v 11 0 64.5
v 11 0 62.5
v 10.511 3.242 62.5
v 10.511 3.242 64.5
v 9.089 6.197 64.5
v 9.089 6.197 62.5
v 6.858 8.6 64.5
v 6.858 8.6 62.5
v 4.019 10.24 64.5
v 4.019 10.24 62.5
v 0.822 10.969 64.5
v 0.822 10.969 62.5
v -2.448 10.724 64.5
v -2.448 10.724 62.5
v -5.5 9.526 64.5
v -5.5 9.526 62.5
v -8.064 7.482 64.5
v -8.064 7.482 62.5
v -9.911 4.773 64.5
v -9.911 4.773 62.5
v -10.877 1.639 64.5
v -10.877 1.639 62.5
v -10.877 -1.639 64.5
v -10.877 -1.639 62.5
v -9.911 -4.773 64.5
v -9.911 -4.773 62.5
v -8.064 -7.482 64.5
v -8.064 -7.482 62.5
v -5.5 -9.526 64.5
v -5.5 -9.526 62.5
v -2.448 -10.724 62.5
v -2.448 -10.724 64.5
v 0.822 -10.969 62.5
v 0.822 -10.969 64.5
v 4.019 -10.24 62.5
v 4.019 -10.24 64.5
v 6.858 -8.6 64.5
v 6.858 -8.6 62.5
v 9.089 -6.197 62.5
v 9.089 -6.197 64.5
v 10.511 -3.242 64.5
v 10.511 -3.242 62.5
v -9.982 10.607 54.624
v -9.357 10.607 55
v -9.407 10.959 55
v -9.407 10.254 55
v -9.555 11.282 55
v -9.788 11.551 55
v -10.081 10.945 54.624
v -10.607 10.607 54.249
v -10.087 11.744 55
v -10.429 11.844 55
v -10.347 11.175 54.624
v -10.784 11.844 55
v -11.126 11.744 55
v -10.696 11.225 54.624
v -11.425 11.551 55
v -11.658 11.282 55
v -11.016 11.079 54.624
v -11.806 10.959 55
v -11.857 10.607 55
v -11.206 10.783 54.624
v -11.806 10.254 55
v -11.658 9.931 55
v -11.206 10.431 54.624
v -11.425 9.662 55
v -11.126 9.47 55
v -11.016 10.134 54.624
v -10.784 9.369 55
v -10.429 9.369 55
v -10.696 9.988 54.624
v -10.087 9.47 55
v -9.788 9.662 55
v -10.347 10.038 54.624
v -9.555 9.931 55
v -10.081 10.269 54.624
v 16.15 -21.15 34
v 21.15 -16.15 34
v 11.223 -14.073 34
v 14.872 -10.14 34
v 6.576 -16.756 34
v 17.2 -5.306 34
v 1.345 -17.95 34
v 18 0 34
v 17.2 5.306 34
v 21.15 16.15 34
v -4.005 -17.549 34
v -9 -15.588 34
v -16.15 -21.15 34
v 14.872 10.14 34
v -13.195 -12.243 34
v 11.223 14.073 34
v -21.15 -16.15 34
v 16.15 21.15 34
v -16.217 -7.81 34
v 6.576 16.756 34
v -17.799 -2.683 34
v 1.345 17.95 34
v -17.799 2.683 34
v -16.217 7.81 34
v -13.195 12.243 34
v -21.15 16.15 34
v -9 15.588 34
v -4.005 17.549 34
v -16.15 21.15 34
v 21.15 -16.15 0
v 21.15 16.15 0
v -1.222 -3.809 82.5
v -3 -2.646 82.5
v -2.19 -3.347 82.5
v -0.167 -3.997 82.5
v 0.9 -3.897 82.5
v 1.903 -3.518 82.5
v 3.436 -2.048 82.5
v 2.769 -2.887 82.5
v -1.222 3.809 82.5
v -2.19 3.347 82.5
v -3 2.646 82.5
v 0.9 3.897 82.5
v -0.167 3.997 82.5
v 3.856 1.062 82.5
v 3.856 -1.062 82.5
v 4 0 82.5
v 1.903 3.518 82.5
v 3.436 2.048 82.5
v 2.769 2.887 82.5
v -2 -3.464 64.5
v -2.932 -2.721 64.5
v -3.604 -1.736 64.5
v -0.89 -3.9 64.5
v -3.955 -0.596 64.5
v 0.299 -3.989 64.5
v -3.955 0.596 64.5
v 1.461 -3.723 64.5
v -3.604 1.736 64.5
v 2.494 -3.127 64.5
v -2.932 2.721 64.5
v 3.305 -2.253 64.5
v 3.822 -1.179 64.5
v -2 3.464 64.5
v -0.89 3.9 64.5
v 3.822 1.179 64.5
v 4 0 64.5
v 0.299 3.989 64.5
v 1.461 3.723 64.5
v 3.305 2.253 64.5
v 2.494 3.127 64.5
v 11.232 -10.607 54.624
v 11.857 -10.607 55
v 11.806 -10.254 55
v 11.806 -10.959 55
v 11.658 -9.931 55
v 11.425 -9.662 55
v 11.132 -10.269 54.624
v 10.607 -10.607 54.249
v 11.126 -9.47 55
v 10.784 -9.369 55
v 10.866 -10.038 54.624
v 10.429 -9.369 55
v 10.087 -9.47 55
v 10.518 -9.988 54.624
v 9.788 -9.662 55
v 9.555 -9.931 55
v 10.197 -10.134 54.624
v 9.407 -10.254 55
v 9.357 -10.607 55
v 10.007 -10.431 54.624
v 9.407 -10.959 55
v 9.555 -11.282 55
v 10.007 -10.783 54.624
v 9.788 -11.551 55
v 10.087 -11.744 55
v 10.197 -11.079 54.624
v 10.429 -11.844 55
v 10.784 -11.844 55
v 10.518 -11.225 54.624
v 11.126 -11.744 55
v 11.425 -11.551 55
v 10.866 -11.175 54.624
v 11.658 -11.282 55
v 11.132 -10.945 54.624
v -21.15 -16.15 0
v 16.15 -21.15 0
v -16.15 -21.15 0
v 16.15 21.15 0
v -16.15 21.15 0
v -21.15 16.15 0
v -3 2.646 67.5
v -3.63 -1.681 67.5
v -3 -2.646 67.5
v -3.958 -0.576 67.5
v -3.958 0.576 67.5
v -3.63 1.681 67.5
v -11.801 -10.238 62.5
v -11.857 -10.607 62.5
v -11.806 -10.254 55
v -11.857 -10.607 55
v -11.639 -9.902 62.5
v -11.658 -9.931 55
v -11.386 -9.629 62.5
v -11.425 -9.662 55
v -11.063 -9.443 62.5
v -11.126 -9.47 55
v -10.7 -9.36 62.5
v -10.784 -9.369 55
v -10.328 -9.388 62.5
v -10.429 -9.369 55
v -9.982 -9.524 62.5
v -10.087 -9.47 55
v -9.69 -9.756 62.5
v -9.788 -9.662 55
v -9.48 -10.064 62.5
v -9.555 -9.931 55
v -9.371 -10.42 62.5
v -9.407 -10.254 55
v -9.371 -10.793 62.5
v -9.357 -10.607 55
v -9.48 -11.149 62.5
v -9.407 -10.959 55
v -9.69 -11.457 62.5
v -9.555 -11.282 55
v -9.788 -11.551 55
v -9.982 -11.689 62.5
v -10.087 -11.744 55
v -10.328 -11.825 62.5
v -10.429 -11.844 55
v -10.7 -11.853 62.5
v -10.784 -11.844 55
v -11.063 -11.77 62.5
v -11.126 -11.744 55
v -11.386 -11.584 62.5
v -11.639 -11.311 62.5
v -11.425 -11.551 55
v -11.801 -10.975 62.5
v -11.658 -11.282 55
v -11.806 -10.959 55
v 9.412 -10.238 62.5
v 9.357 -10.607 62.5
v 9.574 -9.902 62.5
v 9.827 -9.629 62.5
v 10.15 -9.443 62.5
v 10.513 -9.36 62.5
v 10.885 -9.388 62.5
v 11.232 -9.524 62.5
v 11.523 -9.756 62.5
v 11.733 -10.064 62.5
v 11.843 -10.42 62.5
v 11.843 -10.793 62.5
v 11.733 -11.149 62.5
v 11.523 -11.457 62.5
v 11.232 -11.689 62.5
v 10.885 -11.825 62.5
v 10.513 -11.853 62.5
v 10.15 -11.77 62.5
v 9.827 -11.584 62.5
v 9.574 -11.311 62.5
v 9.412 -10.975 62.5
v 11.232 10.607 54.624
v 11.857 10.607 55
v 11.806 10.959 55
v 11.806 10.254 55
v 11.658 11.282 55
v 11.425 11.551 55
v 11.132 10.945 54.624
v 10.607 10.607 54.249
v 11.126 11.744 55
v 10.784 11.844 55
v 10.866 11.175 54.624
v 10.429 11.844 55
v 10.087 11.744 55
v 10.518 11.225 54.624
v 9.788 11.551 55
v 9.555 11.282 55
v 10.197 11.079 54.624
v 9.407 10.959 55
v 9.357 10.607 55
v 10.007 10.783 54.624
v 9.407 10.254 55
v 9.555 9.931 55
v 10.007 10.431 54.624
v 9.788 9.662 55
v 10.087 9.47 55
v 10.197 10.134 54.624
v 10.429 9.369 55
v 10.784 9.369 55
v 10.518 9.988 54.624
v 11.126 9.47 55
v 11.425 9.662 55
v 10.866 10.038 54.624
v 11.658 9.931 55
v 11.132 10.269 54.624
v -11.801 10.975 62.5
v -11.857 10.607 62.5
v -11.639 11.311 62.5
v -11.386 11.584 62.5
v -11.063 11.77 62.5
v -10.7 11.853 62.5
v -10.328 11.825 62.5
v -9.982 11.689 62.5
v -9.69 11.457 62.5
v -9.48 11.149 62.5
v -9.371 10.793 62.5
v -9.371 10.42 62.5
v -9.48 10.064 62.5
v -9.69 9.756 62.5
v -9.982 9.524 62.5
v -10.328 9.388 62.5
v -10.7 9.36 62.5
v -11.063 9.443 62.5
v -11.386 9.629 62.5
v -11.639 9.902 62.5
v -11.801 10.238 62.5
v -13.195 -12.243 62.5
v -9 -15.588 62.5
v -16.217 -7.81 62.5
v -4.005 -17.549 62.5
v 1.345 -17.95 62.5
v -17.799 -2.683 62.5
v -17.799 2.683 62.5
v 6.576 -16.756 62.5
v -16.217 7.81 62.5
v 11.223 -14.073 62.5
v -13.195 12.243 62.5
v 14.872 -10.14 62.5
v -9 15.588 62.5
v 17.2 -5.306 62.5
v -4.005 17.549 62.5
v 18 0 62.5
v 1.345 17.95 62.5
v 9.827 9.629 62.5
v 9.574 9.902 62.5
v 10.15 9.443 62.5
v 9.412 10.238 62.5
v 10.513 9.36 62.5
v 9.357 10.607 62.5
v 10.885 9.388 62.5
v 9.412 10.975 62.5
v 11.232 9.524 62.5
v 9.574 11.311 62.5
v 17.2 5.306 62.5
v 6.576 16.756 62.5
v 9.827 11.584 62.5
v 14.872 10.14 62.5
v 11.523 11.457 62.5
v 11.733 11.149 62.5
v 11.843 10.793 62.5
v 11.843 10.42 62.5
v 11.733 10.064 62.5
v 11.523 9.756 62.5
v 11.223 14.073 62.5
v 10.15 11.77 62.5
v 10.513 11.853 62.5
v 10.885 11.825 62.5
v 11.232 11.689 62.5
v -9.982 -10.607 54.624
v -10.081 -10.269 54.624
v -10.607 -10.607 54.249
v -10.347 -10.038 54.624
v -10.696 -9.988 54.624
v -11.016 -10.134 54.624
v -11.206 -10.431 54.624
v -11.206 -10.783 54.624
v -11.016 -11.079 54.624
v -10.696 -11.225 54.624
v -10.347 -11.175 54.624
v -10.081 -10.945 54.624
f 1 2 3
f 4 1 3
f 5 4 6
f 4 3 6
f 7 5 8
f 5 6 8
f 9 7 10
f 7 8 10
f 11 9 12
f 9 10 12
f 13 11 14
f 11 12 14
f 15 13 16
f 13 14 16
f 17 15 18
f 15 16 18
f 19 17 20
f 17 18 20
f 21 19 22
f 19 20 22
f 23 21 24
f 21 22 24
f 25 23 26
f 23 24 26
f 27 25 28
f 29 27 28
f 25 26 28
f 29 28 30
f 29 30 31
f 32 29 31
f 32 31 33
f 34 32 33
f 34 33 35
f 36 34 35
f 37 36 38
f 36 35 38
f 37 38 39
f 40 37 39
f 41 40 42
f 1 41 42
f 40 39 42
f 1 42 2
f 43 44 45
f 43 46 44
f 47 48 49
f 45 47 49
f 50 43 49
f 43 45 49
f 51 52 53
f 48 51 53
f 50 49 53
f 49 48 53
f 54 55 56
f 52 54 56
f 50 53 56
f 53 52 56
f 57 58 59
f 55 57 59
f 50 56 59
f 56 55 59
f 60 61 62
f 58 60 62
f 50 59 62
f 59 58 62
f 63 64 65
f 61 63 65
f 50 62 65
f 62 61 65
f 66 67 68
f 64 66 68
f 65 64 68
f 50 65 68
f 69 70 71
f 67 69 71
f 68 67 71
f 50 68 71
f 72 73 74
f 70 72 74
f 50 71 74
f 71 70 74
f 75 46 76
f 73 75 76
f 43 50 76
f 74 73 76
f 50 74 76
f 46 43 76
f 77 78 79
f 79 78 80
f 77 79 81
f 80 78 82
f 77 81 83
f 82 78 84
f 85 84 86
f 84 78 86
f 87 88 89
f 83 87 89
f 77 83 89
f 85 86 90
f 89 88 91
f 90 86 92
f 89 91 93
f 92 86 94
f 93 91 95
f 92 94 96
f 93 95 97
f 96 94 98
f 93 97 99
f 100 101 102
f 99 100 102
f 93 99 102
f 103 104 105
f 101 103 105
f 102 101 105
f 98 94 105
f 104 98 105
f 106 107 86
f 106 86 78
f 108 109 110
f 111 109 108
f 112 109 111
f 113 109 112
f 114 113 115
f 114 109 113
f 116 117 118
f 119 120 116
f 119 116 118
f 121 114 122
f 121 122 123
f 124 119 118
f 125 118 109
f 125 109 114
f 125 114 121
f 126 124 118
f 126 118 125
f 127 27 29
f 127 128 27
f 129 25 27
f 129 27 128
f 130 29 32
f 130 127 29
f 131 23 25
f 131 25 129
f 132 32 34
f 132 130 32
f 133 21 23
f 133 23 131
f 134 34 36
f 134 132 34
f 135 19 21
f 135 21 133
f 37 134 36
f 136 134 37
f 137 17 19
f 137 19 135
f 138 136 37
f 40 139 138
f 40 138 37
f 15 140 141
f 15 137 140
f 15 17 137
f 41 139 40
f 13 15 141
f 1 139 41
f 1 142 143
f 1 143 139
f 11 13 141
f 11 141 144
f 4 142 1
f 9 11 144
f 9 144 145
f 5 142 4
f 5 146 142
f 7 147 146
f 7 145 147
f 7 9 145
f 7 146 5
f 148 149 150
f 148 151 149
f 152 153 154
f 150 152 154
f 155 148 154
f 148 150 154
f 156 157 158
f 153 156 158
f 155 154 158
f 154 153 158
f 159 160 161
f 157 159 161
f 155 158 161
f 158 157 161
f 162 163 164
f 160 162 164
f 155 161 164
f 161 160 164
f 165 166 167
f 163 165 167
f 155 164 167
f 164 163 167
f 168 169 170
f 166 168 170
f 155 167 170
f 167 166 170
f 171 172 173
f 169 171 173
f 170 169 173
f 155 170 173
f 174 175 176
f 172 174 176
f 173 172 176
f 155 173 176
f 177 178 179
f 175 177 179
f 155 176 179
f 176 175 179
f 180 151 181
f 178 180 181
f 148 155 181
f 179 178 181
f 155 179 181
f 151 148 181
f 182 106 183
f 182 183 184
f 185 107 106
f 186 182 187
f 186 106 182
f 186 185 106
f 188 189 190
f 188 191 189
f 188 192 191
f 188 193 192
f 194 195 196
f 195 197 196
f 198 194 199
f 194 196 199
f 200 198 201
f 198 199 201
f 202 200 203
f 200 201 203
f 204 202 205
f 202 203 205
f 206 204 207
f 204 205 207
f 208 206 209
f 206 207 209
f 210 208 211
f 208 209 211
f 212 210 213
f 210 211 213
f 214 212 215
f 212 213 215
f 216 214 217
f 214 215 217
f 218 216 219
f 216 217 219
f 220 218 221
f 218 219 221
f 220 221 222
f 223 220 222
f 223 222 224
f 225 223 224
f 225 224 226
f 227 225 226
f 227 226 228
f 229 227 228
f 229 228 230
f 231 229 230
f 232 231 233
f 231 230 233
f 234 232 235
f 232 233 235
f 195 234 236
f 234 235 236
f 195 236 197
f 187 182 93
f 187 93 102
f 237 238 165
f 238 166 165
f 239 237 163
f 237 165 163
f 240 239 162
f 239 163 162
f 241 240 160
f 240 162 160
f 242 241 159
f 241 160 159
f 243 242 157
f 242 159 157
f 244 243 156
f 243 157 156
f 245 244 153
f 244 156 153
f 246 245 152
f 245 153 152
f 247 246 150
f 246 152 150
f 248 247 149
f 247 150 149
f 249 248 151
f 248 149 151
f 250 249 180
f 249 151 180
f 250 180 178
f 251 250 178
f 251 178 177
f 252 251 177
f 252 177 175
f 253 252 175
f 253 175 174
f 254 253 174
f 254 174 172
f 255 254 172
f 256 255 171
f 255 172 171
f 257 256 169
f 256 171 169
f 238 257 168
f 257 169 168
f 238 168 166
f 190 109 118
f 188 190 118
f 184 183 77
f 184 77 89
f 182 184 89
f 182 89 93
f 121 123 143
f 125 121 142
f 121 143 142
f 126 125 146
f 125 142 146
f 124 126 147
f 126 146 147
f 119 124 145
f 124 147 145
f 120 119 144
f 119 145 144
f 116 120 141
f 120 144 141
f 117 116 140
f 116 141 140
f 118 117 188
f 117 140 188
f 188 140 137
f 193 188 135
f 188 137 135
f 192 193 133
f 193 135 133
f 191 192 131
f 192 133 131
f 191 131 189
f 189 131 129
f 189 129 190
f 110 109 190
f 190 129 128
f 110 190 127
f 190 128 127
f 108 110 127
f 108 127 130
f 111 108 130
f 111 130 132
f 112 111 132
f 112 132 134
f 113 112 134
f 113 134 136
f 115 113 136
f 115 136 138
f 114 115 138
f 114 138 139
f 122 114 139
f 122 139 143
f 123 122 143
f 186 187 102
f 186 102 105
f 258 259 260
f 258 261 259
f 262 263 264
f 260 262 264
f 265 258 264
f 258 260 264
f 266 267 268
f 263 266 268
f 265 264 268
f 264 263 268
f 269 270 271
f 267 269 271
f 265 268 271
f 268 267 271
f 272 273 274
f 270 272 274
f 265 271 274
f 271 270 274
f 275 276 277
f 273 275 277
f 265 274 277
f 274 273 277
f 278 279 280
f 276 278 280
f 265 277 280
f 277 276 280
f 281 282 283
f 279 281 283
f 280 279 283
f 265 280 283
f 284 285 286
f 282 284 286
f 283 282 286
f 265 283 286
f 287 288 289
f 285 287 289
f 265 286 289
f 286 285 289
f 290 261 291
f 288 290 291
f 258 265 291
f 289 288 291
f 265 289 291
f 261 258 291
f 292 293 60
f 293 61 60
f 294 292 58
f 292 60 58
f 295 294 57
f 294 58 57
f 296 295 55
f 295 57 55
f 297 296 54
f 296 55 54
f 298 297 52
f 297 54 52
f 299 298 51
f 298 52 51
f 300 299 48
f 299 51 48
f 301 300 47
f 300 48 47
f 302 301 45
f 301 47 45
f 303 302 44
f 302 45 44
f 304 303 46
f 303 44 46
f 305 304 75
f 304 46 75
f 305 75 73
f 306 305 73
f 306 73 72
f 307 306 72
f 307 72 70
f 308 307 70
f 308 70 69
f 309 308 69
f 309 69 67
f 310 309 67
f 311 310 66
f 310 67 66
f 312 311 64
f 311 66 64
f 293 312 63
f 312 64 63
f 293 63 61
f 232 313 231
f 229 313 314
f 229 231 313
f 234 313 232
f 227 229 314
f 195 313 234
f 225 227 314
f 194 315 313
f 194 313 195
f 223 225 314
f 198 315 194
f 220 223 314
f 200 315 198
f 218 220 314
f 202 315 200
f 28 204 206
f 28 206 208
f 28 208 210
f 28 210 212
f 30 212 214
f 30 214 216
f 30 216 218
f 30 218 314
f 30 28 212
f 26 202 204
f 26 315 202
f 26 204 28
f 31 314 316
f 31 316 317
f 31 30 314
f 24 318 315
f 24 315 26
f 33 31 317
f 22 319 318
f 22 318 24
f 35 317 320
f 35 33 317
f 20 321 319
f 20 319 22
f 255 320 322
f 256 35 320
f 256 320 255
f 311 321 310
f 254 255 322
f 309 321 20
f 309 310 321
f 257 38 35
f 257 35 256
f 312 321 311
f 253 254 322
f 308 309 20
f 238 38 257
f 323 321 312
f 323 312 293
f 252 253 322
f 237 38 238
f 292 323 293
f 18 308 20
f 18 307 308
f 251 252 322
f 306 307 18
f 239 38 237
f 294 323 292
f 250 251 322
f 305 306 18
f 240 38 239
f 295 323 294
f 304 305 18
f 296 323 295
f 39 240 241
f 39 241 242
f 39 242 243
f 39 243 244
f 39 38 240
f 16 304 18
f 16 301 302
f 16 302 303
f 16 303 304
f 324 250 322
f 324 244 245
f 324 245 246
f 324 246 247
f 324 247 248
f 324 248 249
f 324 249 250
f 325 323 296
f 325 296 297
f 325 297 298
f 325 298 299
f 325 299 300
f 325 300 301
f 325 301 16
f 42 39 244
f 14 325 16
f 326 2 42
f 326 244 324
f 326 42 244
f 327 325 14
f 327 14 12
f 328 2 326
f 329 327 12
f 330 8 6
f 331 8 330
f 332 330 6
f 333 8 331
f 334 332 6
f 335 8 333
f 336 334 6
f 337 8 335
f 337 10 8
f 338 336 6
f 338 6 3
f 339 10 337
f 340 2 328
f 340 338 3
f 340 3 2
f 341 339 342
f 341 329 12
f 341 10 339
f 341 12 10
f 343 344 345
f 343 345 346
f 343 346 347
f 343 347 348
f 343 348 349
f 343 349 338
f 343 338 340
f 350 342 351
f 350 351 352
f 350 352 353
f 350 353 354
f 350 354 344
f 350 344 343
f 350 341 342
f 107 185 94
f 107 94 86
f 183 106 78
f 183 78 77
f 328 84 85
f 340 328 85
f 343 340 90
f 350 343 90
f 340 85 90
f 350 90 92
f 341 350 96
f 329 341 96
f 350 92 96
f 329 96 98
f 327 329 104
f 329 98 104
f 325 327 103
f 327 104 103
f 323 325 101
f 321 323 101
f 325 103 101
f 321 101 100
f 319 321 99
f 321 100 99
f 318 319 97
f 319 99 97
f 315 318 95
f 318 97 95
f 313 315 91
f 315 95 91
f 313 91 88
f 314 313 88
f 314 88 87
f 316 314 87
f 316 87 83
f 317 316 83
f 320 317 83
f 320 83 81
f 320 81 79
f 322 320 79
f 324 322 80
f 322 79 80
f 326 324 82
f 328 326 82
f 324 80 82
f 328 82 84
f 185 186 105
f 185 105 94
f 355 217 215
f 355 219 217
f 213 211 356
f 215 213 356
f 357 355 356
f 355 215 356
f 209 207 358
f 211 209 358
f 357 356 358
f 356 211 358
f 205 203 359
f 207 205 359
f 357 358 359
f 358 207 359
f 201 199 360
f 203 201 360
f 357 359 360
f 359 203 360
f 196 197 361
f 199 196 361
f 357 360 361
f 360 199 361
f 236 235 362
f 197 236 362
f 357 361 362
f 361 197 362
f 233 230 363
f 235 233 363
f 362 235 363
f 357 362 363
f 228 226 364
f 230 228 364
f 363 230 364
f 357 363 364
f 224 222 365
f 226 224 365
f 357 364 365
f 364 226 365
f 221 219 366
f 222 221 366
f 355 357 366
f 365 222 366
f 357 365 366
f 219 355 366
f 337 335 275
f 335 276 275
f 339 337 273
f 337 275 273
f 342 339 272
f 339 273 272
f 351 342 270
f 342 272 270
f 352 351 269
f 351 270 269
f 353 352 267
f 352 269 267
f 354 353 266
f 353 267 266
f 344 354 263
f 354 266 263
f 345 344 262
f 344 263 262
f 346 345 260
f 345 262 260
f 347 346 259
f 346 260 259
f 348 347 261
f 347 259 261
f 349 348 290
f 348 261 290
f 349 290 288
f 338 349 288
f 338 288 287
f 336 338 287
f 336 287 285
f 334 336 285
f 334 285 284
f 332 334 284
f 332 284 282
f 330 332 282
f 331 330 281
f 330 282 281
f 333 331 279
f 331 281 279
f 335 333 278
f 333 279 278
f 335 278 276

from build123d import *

# Parameters (mm, degrees)
EXTRUDE_1_DEPTH        = 34
SKETCH_2_R             = 18
EXTRUDE_2_DEPTH        = 28.5
SKETCH_3_R             = 11
EXTRUDE_3_DEPTH        = 2
SKETCH_4_R             = 4
EXTRUDE_4_DEPTH        = 18
SKETCH_5_W             = 8.09428643
SKETCH_5_H             = 13.450799509
CUT_EXTRUDE_1_DEPTH    = 15
SKETCH_6_R             = 1
CUT_EXTRUDE_2_DEPTH    = 5
HOLE_WIZARD_M3_1_D     = 2.5
HOLE_WIZARD_M3_1_DEPTH = 7.5
HOLE_WIZARD_M3_1_TIP   = 0.751075774


with BuildPart() as part:
    # 草图1 → 凸台-拉伸1 (new body)
    with BuildSketch(Plane.XY):
        Polygon((-21.15, 16.15), (-16.15, 21.15), (16.15, 21.15), (21.15, 16.15), (21.15, -16.15), (16.15, -21.15), (-16.15, -21.15), (-21.15, -16.15), align=None)
    extrude(amount=EXTRUDE_1_DEPTH)

    # 草图2 → 凸台-拉伸2 (add)
    with BuildSketch(Plane.XY.offset(34)):
        Circle(SKETCH_2_R)
    extrude(amount=EXTRUDE_2_DEPTH)

    # 草图3 → 凸台-拉伸3 (add)
    with BuildSketch(Plane.XY.offset(62.5)):
        Circle(SKETCH_3_R)
    extrude(amount=EXTRUDE_3_DEPTH)

    # 草图4 → 凸台-拉伸4 (add)
    with BuildSketch(Plane.XY.offset(64.5)):
        Circle(SKETCH_4_R)
    extrude(amount=EXTRUDE_4_DEPTH)

    # 草图5 → 切除-拉伸1 (cut)
    with BuildSketch(Plane.XY.offset(82.5)):
        with Locations((-7.047143215, -1.347451383)):
            Rectangle(SKETCH_5_W, SKETCH_5_H)
    extrude(amount=-CUT_EXTRUDE_1_DEPTH, mode=Mode.SUBTRACT)

    # 草图6 → 切除-拉伸2 (cut)
    with BuildSketch(Plane.XY.offset(62.5)):
        with Locations((-10.606601718, 10.606601718)):
            Circle(SKETCH_6_R)
        with Locations((10.606601718, 10.606601718)):
            Circle(SKETCH_6_R)
        with Locations((-10.606601718, -10.606601718)):
            Circle(SKETCH_6_R)
        with Locations((10.606601718, -10.606601718)):
            Circle(SKETCH_6_R)
    extrude(amount=-CUT_EXTRUDE_2_DEPTH, mode=Mode.SUBTRACT)

    # M3 螺纹孔1
    with Locations(Plane.XY.offset(62.5)):
        with Locations((-10.606601718, 10.606601718), (10.606601718, 10.606601718), (-10.606601718, -10.606601718), (10.606601718, -10.606601718)):
            Hole(HOLE_WIZARD_M3_1_D / 2, depth=HOLE_WIZARD_M3_1_DEPTH)
            with Locations((0, 0, -(HOLE_WIZARD_M3_1_DEPTH + HOLE_WIZARD_M3_1_TIP / 2))):  # 118° drill point
                Cone(0, HOLE_WIZARD_M3_1_D / 2, HOLE_WIZARD_M3_1_TIP, mode=Mode.SUBTRACT)


solid = part.part
